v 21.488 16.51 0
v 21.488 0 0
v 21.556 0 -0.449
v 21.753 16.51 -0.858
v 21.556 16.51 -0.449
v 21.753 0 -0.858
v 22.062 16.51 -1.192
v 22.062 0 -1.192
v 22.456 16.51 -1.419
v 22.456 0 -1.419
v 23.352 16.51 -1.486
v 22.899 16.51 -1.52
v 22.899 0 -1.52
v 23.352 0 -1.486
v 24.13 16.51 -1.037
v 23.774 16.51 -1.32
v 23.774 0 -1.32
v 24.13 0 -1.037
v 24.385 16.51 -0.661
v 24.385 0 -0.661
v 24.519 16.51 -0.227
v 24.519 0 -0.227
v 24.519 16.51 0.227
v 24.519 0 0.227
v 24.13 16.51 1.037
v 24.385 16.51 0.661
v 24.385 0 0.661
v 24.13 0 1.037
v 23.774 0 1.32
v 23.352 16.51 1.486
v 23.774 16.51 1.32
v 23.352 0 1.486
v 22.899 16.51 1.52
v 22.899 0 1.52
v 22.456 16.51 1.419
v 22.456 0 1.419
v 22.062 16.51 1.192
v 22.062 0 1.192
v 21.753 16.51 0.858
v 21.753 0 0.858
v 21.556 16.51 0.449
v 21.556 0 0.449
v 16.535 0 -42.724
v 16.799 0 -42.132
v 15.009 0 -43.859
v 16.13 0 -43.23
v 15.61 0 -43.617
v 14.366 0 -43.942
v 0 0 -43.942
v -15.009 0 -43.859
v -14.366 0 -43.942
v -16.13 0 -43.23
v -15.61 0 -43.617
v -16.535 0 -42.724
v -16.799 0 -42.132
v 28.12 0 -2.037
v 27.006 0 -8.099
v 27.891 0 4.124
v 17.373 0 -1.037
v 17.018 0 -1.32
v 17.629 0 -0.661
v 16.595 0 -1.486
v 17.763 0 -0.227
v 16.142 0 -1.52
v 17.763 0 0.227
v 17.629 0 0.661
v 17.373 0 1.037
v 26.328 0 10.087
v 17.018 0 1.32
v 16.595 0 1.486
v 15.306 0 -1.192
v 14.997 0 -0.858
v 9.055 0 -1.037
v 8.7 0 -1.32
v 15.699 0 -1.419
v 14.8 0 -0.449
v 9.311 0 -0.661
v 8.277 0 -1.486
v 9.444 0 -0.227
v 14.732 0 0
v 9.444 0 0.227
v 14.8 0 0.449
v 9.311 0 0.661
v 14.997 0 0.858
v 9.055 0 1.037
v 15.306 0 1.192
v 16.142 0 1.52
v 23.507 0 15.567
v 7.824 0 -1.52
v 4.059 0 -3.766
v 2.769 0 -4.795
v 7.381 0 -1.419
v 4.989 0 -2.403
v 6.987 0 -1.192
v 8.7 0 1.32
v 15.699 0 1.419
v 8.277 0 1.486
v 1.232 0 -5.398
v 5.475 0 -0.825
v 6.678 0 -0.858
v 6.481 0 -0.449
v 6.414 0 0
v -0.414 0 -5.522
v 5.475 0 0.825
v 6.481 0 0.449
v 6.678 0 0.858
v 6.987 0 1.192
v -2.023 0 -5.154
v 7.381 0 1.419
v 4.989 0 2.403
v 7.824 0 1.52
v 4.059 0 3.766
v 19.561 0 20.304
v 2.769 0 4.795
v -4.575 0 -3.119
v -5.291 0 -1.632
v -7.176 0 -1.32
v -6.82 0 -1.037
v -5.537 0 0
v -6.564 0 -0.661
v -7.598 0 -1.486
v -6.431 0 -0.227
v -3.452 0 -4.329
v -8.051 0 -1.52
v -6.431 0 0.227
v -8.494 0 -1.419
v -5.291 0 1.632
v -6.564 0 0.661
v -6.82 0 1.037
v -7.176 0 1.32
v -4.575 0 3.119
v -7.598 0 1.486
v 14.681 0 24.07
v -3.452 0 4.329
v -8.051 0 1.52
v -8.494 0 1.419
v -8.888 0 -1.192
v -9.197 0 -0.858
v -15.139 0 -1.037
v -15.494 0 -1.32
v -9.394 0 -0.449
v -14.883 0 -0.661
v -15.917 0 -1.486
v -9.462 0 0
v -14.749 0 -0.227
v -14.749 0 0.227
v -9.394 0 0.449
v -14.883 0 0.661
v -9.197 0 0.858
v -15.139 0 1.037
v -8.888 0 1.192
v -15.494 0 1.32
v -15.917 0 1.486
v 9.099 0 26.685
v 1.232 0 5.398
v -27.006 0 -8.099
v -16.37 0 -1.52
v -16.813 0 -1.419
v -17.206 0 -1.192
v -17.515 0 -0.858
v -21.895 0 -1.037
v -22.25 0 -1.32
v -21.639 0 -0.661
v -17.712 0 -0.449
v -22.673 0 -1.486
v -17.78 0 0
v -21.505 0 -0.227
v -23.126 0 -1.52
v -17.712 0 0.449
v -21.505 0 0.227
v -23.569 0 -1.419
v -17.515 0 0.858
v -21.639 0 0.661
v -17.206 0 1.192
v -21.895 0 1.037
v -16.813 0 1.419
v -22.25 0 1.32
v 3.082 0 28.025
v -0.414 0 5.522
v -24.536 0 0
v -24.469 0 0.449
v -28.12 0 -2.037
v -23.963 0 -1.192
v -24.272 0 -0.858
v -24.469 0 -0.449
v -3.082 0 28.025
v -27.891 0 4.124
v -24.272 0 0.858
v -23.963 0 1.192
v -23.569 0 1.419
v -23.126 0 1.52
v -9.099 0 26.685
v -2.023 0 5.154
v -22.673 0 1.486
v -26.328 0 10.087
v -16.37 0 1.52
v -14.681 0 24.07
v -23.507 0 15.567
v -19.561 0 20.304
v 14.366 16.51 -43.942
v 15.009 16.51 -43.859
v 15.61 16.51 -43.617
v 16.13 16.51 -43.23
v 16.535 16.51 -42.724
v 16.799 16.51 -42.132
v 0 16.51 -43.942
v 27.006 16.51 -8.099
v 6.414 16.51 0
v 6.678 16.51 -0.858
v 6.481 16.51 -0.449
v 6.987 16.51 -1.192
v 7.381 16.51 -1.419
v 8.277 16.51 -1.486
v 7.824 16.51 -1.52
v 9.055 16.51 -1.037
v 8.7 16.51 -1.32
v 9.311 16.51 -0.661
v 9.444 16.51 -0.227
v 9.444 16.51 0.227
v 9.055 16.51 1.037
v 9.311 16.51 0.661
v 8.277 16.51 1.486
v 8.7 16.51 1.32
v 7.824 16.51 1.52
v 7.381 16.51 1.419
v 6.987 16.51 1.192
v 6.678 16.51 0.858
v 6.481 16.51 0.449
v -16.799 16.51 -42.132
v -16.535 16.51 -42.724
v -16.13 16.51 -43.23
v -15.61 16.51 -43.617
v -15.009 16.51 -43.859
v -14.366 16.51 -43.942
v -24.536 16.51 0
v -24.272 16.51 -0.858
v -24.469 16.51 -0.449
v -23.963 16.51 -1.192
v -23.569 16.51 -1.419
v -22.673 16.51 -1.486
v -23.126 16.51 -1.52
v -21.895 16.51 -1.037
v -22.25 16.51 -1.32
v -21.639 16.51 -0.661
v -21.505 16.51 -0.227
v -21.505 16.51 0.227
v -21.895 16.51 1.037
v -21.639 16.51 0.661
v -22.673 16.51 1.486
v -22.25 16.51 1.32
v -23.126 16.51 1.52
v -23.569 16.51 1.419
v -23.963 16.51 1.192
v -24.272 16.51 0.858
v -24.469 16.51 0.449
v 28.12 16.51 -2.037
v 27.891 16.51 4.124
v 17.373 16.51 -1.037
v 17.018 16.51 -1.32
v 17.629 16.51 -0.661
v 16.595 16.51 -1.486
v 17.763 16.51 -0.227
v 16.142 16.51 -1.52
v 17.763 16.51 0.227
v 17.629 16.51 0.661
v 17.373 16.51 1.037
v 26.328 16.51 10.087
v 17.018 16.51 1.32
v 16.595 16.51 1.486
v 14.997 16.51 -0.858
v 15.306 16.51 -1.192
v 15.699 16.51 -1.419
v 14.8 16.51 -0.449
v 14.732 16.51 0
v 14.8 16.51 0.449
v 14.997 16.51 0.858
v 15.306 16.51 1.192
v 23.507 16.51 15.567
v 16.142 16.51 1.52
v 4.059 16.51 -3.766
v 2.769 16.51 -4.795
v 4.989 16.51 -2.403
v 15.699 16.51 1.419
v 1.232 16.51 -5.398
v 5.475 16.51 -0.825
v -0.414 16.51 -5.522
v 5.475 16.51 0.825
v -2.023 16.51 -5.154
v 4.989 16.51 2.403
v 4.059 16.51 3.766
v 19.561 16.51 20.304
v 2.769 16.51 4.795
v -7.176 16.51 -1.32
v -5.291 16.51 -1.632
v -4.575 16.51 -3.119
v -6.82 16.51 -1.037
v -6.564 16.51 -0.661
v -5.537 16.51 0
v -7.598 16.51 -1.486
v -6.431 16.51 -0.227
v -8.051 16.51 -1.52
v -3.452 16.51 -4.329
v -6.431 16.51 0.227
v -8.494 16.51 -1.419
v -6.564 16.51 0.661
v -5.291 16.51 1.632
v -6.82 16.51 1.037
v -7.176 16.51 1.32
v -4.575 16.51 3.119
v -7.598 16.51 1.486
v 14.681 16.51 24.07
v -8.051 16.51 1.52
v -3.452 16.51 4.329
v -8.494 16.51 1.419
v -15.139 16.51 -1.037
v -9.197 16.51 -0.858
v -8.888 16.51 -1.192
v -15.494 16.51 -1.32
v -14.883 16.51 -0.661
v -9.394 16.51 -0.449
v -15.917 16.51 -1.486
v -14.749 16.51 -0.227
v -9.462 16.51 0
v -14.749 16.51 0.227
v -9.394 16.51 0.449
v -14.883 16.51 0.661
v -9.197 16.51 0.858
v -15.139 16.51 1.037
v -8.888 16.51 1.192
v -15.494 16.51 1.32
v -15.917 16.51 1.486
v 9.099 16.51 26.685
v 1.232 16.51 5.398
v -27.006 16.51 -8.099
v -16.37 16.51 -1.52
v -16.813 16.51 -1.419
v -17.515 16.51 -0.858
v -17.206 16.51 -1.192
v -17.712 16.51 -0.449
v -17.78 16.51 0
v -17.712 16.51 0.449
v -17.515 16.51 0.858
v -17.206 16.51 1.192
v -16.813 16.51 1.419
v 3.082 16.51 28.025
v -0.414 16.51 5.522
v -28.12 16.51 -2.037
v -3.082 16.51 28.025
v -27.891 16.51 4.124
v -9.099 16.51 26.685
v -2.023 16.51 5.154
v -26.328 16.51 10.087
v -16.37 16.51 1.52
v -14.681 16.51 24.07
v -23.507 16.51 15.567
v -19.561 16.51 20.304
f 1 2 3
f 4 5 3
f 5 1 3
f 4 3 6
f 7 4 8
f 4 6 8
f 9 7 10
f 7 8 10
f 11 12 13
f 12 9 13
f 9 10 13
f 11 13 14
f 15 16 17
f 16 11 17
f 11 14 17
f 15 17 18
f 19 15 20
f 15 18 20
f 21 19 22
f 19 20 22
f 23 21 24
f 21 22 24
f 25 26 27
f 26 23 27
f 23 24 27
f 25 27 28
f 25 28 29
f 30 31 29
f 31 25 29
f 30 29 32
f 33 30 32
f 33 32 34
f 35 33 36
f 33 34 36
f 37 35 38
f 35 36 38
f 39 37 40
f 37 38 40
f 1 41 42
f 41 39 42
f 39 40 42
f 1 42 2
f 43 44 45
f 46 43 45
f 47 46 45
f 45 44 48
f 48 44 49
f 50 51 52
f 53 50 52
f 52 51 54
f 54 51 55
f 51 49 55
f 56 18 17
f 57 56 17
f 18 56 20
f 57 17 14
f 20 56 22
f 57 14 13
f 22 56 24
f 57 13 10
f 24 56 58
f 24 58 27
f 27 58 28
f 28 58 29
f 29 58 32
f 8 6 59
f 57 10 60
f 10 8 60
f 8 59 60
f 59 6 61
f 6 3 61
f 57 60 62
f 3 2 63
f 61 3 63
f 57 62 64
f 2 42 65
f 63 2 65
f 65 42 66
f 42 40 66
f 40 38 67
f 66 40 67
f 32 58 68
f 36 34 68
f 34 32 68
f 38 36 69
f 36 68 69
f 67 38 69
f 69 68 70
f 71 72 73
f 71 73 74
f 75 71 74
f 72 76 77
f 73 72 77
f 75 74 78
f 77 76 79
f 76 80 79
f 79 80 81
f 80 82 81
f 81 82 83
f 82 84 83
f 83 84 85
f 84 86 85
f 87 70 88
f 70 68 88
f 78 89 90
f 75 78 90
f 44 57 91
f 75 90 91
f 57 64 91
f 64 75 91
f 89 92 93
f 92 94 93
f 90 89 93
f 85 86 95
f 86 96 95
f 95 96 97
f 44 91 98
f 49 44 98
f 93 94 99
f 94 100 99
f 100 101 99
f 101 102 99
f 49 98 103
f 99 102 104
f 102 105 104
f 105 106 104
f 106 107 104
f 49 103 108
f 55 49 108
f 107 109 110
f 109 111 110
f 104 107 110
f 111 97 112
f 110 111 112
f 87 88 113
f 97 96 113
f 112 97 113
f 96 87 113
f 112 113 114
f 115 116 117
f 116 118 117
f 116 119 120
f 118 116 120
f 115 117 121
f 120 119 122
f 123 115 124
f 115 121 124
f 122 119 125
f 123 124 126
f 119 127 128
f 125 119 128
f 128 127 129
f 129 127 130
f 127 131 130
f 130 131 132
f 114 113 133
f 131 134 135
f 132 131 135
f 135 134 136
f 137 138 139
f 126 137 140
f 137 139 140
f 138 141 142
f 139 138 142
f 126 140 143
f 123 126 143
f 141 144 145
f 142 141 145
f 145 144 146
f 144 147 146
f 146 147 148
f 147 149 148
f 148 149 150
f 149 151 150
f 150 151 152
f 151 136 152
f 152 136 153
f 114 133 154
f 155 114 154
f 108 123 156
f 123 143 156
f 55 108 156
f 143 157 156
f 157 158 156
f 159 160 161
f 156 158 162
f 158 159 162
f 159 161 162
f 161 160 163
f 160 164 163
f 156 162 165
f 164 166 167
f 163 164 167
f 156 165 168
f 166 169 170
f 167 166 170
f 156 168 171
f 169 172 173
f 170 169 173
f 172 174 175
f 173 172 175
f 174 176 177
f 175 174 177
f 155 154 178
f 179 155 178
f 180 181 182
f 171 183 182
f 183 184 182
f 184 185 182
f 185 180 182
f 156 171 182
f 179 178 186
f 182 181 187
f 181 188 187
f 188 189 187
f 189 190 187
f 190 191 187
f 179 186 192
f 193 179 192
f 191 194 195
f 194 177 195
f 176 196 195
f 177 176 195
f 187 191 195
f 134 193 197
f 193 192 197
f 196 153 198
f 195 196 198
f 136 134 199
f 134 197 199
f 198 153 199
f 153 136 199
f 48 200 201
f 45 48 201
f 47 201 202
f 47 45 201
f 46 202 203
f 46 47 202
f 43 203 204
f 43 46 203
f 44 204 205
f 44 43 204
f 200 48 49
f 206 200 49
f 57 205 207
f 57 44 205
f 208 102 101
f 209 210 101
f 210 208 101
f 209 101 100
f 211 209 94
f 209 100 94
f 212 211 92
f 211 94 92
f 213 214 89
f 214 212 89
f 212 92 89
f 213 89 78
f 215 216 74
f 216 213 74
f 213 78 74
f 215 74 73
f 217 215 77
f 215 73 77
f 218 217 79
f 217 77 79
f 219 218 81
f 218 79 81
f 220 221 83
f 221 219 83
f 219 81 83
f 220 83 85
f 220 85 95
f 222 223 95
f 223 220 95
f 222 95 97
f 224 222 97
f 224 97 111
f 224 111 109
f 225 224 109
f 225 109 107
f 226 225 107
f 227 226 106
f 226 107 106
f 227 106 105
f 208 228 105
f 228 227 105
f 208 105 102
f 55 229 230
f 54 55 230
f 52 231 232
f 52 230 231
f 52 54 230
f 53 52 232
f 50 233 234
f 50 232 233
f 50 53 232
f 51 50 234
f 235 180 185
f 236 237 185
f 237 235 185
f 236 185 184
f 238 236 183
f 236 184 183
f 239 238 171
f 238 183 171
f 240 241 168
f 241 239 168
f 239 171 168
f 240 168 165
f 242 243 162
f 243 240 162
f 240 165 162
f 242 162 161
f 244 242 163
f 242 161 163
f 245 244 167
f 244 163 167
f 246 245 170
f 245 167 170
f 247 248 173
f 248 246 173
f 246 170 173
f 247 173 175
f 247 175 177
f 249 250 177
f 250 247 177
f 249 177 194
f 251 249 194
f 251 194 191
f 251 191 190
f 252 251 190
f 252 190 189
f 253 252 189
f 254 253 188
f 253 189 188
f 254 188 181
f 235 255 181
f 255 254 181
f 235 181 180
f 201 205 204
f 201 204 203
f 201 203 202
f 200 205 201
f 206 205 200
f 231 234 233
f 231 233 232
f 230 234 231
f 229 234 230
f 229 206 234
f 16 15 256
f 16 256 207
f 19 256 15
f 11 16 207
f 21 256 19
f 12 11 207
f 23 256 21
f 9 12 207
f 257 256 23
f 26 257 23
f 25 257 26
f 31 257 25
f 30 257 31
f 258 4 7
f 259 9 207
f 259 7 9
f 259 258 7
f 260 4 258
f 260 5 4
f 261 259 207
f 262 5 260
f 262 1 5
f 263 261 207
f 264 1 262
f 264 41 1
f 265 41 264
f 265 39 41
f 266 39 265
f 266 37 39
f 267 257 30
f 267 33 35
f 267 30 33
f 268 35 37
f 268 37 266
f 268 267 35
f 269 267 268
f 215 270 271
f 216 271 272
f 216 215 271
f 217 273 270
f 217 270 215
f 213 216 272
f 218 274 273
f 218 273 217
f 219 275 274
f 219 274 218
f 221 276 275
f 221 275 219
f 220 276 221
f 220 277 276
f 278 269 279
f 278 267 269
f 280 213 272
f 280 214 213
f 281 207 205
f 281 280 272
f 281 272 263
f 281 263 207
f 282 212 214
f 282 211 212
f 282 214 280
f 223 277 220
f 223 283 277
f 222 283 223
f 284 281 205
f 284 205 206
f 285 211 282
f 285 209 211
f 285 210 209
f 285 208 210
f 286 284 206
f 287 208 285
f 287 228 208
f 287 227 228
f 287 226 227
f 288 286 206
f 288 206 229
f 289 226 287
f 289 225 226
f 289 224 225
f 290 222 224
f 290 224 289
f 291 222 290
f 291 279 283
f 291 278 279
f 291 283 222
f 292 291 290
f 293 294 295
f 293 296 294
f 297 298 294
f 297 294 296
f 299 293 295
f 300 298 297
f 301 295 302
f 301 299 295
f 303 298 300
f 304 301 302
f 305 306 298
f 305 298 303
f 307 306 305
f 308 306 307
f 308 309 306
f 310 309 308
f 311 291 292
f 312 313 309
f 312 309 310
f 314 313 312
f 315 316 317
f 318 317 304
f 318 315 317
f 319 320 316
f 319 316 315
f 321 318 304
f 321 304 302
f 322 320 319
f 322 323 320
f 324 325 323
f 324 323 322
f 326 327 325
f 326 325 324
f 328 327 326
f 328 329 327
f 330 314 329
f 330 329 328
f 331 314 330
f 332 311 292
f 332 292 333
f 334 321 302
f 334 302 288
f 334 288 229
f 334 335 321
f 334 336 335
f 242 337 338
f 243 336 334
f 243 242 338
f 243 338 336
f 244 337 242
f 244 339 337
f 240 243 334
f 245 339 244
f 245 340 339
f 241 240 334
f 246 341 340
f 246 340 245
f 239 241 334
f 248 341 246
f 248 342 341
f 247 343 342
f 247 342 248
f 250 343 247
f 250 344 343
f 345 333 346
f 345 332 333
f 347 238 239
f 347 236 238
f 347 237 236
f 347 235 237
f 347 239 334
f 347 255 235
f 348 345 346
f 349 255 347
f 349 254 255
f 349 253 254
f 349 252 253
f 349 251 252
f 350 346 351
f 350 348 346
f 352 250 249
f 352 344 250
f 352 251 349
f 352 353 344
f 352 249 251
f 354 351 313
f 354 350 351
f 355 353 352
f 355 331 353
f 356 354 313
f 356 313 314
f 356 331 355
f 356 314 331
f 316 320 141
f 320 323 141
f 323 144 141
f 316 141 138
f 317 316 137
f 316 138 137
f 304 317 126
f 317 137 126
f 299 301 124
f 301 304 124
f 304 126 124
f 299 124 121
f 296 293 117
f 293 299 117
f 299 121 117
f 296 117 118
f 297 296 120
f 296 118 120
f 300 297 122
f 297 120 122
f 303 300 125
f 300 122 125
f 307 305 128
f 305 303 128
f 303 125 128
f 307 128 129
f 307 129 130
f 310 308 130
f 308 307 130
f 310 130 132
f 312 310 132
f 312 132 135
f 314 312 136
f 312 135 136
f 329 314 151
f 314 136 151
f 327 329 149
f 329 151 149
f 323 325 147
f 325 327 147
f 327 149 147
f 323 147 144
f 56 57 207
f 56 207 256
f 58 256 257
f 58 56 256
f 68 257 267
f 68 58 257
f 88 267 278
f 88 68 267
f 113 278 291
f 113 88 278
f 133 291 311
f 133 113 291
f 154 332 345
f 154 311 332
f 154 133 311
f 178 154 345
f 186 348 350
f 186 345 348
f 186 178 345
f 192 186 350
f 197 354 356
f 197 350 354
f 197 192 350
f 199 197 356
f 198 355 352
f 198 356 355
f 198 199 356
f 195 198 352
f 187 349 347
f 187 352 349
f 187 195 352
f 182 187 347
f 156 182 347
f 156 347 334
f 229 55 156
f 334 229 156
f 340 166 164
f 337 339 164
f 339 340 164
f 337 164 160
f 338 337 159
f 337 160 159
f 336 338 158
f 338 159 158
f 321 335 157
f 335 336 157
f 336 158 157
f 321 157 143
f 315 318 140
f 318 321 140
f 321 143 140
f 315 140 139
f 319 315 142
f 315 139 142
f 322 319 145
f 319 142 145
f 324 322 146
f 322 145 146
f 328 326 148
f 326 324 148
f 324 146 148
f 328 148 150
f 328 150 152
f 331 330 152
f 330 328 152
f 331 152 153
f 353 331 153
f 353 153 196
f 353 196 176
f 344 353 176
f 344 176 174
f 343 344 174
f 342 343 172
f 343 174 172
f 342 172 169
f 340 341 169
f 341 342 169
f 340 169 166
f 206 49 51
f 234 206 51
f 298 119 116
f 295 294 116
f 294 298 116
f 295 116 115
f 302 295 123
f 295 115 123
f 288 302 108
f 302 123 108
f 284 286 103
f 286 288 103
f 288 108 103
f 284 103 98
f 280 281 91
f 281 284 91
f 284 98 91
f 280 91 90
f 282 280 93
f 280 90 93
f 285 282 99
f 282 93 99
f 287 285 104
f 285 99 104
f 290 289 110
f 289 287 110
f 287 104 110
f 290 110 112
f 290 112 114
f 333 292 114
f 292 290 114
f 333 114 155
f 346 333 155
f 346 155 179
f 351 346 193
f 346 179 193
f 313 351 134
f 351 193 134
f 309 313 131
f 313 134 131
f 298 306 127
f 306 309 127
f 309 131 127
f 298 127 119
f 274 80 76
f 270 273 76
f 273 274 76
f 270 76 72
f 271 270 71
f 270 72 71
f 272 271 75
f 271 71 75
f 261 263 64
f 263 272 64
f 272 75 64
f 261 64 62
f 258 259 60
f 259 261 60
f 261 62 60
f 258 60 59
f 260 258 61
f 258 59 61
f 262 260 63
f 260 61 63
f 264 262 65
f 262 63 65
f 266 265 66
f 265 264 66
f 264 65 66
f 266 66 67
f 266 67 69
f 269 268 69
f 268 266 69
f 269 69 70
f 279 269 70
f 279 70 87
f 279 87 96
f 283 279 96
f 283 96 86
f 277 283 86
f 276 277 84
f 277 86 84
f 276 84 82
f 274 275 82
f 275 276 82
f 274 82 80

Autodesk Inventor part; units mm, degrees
ref_plane "YZ Plane" through (0, 0, 0) normal (1, 0, 0) x (0, 1, 0)
ref_plane "XZ Plane" through (0, 0, 0) normal (0, 1, 0) x (-1, 0, 0)
ref_plane "XY Plane" through (0, 0, 0) normal (0, 0, 1) x (1, 0, 0)
sketch "Sketch1" plane through (0, 0, 0) normal (0, 1, 0) x (-1, 0, 0)
  arc A0 (27.0056, -8.0993) -> (-27.0056, -8.0993) centre (0, 0) ccw
  line L0 (0, -43.942) -> (14.366, -43.942)
  line L1 (-14.366, -43.942) -> (0, -43.942)
  line L2 (0, 15.1299) -> (0, -95.843) construction
  line L3 (33.8234, 0) -> (-34.0336, 0) construction
  line L4 (16.256, 0) -> (16.256, -43.942) construction
  line L5 (16.7989, -42.1317) -> (27.0056, -8.0993)
  line L6 (-16.7989, -42.1317) -> (-27.0056, -8.0993)
  circle A1 centre (0, 0) radius 5.5372
  arc A2 (14.366, -43.942) -> (16.7989, -42.1317) centre (14.366, -41.402) ccw
  arc A3 (-16.7989, -42.1317) -> (-14.366, -43.942) centre (-14.366, -41.402) ccw
  circle A4 centre (7.9375, 0) radius 1.524
  line L7 (0, 0) -> (7.9375, 0) construction
  circle A5 centre (-7.9375, 0) radius 1.524
  line L8 (0, 0) -> (-7.9375, 0) construction
  circle A6 centre (16.256, 0) radius 1.524
  line L9 (0, 0) -> (16.256, 0) construction
  circle A7 centre (-16.256, 0) radius 1.524
  line L10 (0, 0) -> (-16.256, 0) construction
  circle A8 centre (23.0124, 0) radius 1.524
  line L11 (0, 0) -> (23.0124, 0) construction
  circle A9 centre (-23.0124, 0) radius 1.524
  line L12 (0, 0) -> (-23.0124, 0) construction
  point P0 (-16.256, -43.942)
  dimension "d0" = 56.388
  dimension "d4" = 16.256
  dimension "d5" = 16.256
  dimension "d6" = 43.942
  dimension "d7" = 11.0744
  dimension "d8" = 2.54
  dimension "d9" = 3.048
  dimension "d10" = 7.9375
  dimension "d12" = 3.048
  dimension "d13" = 16.256
  dimension "d15" = 3.048
  dimension "d16" = 23.0124
extrude "Extrusion1" add sketch "Sketch1" along normal blind 16.51
properties part number "encoder"
